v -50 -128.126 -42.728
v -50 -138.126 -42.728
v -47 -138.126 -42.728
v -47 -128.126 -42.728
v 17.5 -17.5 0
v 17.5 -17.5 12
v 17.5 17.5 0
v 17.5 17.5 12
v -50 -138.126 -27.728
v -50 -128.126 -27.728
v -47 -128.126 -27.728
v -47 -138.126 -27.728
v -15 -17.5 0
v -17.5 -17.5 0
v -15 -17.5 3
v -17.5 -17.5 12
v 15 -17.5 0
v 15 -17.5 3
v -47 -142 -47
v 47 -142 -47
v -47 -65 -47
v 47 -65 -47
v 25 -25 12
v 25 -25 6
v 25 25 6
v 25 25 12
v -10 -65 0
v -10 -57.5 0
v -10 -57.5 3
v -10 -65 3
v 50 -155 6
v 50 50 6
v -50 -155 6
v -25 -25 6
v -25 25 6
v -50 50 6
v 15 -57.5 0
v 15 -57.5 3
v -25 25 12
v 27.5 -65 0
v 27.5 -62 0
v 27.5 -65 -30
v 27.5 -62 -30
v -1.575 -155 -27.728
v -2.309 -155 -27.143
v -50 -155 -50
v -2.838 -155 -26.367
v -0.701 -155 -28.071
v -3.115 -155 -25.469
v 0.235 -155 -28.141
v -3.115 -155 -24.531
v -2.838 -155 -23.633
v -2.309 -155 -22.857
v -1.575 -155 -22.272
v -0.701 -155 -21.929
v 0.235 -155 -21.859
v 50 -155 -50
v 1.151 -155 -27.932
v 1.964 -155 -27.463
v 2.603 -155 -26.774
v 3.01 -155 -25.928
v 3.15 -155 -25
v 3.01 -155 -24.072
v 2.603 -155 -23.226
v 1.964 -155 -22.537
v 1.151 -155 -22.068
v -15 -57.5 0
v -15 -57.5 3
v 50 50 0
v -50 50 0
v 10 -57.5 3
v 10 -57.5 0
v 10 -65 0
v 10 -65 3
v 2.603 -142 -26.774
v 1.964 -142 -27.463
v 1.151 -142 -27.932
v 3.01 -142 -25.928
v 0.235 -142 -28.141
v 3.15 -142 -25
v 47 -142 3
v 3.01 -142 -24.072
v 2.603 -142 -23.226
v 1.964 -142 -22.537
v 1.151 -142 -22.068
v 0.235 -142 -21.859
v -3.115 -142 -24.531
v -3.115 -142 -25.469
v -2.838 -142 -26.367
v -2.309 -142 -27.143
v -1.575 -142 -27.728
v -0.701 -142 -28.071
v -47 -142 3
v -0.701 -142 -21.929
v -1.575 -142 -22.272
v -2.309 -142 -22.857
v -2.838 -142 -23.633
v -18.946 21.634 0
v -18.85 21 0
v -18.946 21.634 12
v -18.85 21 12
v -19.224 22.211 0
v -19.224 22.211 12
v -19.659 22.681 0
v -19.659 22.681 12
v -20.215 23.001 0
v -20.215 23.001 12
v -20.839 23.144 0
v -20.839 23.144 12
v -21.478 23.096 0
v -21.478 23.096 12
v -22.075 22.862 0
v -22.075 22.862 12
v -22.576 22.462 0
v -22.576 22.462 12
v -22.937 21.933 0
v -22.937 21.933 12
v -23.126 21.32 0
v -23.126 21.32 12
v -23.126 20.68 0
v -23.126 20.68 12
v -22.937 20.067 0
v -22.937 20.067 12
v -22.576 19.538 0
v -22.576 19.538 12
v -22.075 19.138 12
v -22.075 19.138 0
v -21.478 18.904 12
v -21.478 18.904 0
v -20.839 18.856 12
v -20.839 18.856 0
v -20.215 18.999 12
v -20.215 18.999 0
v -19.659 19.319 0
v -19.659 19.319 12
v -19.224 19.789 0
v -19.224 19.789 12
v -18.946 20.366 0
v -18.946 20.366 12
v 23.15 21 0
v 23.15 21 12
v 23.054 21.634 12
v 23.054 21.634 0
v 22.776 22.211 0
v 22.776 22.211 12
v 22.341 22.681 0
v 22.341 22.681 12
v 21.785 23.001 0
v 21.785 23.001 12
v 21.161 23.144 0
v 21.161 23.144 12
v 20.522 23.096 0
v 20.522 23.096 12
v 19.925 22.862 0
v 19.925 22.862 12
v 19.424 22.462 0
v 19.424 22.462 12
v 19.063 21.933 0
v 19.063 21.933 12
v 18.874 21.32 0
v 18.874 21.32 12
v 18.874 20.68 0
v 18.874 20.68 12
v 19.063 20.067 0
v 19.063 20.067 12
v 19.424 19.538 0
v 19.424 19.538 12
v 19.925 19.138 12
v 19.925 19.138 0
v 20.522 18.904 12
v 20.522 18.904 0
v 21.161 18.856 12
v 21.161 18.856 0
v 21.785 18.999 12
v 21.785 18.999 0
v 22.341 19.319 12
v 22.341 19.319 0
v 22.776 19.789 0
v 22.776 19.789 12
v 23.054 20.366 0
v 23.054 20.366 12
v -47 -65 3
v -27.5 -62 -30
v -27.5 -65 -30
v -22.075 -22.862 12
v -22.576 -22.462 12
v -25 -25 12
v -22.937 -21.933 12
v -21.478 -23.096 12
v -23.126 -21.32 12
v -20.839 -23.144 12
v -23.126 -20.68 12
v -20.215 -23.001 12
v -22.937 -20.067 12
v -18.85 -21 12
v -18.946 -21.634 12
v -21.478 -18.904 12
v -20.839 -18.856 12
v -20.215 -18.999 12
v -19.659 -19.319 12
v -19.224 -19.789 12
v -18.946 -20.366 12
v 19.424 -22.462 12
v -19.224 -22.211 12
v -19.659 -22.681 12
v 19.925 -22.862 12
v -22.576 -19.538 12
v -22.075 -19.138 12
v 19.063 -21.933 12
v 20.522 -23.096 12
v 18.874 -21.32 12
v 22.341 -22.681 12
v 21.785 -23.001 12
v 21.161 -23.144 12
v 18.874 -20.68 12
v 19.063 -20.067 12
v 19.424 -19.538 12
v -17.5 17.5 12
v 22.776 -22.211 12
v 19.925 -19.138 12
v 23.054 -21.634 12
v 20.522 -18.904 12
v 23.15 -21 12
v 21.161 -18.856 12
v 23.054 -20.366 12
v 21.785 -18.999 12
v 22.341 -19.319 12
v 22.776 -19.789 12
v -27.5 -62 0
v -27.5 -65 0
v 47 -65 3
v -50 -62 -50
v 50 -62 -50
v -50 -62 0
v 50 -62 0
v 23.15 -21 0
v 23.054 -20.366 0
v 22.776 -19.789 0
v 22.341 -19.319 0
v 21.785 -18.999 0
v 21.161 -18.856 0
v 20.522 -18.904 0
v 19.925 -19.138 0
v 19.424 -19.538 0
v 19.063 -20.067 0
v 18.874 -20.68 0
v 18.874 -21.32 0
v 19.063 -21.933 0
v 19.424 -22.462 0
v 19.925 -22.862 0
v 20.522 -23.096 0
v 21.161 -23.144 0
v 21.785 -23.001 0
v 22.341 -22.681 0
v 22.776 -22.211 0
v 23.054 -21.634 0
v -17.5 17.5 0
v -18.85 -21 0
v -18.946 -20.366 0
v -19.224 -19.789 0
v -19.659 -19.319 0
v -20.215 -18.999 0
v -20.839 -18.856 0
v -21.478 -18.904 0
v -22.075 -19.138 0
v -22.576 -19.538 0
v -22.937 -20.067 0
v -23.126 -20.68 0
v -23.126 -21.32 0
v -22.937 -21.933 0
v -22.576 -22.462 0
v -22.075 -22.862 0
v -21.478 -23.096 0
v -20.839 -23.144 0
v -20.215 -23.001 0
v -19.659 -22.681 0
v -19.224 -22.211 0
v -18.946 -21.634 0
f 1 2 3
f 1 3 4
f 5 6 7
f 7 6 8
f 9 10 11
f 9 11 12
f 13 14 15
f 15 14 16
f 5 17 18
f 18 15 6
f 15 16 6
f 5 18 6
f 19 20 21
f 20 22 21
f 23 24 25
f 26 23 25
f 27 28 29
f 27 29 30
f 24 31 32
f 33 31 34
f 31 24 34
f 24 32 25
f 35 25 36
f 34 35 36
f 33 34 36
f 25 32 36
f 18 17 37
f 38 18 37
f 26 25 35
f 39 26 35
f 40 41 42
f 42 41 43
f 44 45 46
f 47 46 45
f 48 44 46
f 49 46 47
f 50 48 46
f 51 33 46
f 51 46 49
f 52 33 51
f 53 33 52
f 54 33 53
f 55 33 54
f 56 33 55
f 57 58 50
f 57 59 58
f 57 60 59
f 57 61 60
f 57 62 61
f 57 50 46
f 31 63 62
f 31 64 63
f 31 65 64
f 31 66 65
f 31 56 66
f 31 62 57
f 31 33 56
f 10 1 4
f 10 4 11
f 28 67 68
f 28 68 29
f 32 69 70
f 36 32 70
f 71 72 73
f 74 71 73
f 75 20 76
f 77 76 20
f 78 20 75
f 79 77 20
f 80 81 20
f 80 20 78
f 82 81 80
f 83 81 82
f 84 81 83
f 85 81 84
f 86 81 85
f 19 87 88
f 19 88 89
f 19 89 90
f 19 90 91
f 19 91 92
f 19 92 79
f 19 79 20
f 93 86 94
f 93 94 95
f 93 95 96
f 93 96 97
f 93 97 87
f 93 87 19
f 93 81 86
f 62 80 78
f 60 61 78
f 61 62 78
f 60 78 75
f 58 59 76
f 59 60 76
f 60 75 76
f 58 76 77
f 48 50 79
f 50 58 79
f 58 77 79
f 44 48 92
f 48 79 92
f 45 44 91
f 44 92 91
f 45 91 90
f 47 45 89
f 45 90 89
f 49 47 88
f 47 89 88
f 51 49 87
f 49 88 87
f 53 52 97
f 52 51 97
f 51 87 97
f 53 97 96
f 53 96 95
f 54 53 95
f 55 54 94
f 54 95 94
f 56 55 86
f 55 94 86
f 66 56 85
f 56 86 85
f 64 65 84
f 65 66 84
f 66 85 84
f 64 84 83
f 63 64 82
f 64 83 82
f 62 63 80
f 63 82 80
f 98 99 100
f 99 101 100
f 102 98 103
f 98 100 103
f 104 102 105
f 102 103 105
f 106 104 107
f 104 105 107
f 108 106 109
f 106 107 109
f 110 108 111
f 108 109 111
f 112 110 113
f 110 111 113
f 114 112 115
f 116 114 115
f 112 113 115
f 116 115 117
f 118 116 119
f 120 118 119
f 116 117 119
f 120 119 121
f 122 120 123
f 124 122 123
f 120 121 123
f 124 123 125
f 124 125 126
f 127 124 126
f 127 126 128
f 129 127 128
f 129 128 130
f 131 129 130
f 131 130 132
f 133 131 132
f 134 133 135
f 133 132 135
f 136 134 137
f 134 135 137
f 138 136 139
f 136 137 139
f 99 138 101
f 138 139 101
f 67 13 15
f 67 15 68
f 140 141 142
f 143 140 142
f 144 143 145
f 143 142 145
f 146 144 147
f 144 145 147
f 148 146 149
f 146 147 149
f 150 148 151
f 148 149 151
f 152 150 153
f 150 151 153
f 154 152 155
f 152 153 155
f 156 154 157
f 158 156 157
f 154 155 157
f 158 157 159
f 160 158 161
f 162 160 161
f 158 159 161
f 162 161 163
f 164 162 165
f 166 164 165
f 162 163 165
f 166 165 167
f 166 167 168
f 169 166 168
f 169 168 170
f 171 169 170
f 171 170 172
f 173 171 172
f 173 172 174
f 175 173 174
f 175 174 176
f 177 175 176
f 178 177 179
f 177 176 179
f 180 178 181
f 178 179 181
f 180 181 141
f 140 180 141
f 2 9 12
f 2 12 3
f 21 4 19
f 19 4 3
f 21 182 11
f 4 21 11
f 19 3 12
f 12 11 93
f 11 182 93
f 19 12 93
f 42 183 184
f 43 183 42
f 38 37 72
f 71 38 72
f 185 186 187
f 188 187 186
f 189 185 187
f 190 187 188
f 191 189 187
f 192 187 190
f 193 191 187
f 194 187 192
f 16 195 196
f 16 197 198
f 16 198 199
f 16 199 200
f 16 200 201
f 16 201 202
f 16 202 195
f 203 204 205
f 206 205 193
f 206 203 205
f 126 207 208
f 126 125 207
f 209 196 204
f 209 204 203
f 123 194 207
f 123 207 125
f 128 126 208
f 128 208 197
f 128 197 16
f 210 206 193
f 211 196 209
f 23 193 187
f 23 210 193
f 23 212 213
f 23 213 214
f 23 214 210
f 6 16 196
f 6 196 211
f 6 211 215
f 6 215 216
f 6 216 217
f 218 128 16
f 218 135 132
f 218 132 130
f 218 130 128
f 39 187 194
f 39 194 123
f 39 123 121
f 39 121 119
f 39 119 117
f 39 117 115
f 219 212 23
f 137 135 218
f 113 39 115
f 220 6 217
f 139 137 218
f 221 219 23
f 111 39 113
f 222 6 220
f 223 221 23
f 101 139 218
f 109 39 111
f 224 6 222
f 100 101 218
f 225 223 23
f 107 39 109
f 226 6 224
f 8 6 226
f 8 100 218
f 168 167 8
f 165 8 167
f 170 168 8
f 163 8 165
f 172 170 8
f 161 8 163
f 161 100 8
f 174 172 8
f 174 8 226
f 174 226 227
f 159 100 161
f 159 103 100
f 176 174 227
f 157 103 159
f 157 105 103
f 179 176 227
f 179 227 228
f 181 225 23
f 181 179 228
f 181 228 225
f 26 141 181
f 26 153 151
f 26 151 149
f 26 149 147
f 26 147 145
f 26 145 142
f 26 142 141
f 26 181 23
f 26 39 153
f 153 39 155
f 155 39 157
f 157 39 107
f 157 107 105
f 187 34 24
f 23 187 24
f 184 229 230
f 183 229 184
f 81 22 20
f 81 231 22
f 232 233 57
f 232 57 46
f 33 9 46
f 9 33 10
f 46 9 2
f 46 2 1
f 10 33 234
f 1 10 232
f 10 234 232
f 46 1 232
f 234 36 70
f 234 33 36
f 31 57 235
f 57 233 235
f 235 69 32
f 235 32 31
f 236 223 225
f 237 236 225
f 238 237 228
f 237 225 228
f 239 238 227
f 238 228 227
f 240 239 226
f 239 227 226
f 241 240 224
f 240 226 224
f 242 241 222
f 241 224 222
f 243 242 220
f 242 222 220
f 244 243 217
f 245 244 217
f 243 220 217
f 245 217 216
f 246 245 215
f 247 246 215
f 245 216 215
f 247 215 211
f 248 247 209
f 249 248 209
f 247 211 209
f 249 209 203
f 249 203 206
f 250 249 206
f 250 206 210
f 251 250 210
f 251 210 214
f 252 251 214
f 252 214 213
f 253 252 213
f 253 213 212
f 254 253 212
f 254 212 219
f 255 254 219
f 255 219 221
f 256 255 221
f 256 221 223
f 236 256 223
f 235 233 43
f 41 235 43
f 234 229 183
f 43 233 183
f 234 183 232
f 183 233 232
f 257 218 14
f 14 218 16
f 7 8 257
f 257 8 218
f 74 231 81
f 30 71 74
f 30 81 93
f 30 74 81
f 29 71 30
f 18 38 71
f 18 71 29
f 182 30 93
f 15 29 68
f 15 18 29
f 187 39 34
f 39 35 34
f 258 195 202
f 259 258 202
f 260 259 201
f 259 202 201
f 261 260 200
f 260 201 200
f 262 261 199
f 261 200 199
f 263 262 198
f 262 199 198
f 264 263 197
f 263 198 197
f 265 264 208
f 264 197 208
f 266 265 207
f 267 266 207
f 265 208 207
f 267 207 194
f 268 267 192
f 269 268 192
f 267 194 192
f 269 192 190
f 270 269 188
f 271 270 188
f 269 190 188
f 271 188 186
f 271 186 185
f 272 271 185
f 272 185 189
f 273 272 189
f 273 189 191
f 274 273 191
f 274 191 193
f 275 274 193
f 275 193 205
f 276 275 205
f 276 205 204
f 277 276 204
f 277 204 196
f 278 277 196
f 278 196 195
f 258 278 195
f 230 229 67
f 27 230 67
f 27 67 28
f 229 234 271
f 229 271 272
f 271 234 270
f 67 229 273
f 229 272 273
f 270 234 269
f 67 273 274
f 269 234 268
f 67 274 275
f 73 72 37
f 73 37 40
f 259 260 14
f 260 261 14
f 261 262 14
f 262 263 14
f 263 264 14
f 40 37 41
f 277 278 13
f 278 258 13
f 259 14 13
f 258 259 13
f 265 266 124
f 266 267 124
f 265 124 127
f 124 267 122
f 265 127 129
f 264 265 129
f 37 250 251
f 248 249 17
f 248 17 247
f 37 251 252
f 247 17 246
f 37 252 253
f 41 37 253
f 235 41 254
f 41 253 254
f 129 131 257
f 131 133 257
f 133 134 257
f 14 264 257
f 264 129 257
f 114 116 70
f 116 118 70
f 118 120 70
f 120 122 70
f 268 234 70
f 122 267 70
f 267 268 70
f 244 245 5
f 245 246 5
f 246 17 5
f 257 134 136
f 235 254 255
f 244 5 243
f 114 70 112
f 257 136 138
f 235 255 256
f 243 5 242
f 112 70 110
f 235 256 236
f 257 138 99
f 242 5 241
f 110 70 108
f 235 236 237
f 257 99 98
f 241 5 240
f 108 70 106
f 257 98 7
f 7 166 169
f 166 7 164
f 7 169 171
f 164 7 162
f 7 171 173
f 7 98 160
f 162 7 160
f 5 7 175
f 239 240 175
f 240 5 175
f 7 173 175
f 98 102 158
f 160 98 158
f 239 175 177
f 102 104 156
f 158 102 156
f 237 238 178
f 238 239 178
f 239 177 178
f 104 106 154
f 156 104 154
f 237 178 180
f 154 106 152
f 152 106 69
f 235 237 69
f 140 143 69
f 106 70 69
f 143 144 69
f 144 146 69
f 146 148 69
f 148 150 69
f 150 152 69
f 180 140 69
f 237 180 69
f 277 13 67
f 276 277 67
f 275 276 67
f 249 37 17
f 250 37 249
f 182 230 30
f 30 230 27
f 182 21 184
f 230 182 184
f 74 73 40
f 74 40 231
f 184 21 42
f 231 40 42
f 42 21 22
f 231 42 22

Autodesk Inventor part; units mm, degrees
ref_plane "YZ Plane" through (0, 0, 0) normal (1, 0, 0) x (0, 1, 0)
ref_plane "XZ Plane" through (0, 0, 0) normal (0, 1, 0) x (-1, 0, 0)
ref_plane "XY Plane" through (0, 0, 0) normal (0, 0, 1) x (1, 0, 0)
sketch "草图1" plane through (0, 0, 0) normal (0, 0, 1) x (1, 0, 0)
  line L0 (-50, -50) -> (50, -50)
  line L1 (50, -50) -> (50, 50)
  line L2 (50, 50) -> (-50, 50)
  line L3 (-50, 50) -> (-50, -50)
  line L4 (-50, -50) -> (50, 50) construction
  line L5 (50, -50) -> (-50, 50) construction
  line L6 (-50, -50) -> (50, -50)
  line L7 (50, -50) -> (50, -65)
  line L8 (50, -65) -> (-50, -65)
  line L9 (-50, -65) -> (-50, -50)
  point P0 (0, 0)
  dimension "d0" = 100
  dimension "d1" = 100
  dimension "d2" = 15
extrude "拉伸1" add sketch "草图1" along normal blind 6
sketch "草图2" plane through (0, 0, 6) normal (0, 0, 1) x (1, 0, 0)
  line L0 (-25, -25) -> (25, -25)
  line L1 (25, -25) -> (25, 25)
  line L2 (25, 25) -> (-25, 25)
  line L3 (-25, 25) -> (-25, -25)
  line L4 (-25, -25) -> (25, 25) construction
  line L5 (25, -25) -> (-25, 25) construction
  point P0 (0, 0)
  dimension "d5" = 50
  dimension "d6" = 50
extrude "拉伸2" add sketch "草图2" along normal blind 6
sketch "草图3" plane through (0, 0, 12) normal (0, 0, 1) x (1, 0, 0)
  line L0 (-17.5, -17.5) -> (17.5, -17.5)
  line L1 (17.5, -17.5) -> (17.5, 17.5)
  line L2 (17.5, 17.5) -> (-17.5, 17.5)
  line L3 (-17.5, 17.5) -> (-17.5, -17.5)
  line L4 (-17.5, -17.5) -> (17.5, 17.5) construction
  line L5 (17.5, -17.5) -> (-17.5, 17.5) construction
  point P0 (0, 0)
  dimension "d9" = 35
  dimension "d10" = 35
extrude "拉伸3" cut sketch "草图3" against normal through all
sketch "草图4" plane through (0, 0, 12) normal (0, 0, 1) x (1, 0, 0)
  line L0 (-21, -21) -> (21, -21)
  line L1 (21, -21) -> (21, 21)
  line L2 (21, 21) -> (-21, 21)
  line L3 (-21, 21) -> (-21, -21)
  line L4 (-21, -21) -> (21, 21) construction
  line L5 (21, -21) -> (-21, 21) construction
  circle A0 centre (21, 21) radius 2.15
  circle A1 centre (-21, 21) radius 2.15
  circle A2 centre (-21, -21) radius 2.15
  circle A3 centre (21, -21) radius 2.15
  point P0 (0, 0)
  dimension "d13" = 42
  dimension "d14" = 42
  dimension "d15" = 4.3
  dimension "d16" = 4.3
  dimension "d17" = 4.3
  dimension "d18" = 4.3
extrude "拉伸4" cut sketch "草图4" against normal through all contours L3 A2 L0 | L0 A2 L3 | A3 L1 L0 | L0 L1 A3 | A1 L2 L3 | L3 L2 A1 | A0 L2 L1 | L1 L2 A0
sketch "草图5" plane through (0, 0, 0) normal (0, 0, -1) x (-1, 0, 0)
  line L0 (0, 0) -> (15, 0)
  line L1 (15, -17.5) -> (15, -57.5)
  line L2 (15, -57.5) -> (0, -57.5)
  line L3 (-17.5, -17.5) -> (17.5, -17.5) projected
  line L4 (15, -17.5) -> (0, -17.5)
  line L5 (-15, -17.5) -> (-15, -57.5)
  line L6 (-15, -57.5) -> (0, -57.5)
  line L7 (17.5, -17.5) -> (-17.5, -17.5)
  line L8 (0, -57.5) -> (10, -57.5)
  line L9 (10, -57.5) -> (10, -76.7389)
  line L10 (10, -76.7389) -> (0, -76.7389)
  line L11 (0, -76.7389) -> (0, -57.5)
  line L12 (-10, -57.5) -> (-10, -76.7389)
  line L13 (-10, -76.7389) -> (0, -76.7389)
  dimension "d21" = 15
  dimension "d22" = 40
  dimension "d23" = 10
extrude "拉伸5" cut sketch "草图5" against normal blind 3
sketch "草图6" plane through (0, 0, 0) normal (0, 0, -1) x (-1, 0, 0)
  point P0 (0, 0)
sketch "草图7" plane through (-50, -65, 6) normal (0, -1, 0) x (1, 0, 0)
  line L0 (100, -6) -> (0, -6) projected
  line L1 (0, -6) -> (0, 0) projected
  line L2 (100, -6) -> (0, -6)
  line L3 (0, -6) -> (0, 0)
  line L4 (0, 0) -> (100, 0)
  line L5 (100, 0) -> (100, -6)
  point P0 (50, -6)
extrude "拉伸6" add sketch "草图7" along normal blind 80
sketch "草图8" plane through (0, 0, 0) normal (0, 0, -1) x (-1, 0, 0)
  line L0 (10, -65) -> (-10, -65) projected
  line L1 (50, 50) -> (50, -145) projected
  line L2 (0, -65) -> (50, -65)
  line L3 (50, -65) -> (50, -145)
  line L4 (50, -145) -> (0, -145)
  line L5 (0, -145) -> (0, -65)
  line L6 (-50, 50) -> (-50, -145)
  line L7 (0, -65) -> (-50, -65)
  line L8 (-50, -145) -> (0, -145)
  point P0 (0, 0)
extrude "拉伸7" cut sketch "草图8" against normal blind 3
sketch "草图9" plane through (0, 0, 3) normal (0, 0, -1) x (-1, 0, 0)
  line L0 (-50, -145) -> (-50, -65) projected
  line L1 (-50, -65) -> (-47, -65)
  line L2 (-47, -65) -> (-47, -142)
  line L3 (-47, -155.7604) -> (-50, -155.7604)
  line L4 (-50, -145) -> (-50, -65)
  line L5 (50, 50) -> (50, -145) projected
  line L6 (50, -65) -> (47, -65)
  line L7 (47, -65) -> (47, -142)
  line L8 (47, -155.7604) -> (50, -155.7604)
  line L9 (50, -145) -> (50, -65)
  line L10 (-47, -142) -> (47, -142)
  line L11 (63.4475, -142) -> (63.4475, -145)
  line L12 (50, -145) -> (-50, -145)
  line L13 (-50, -145) -> (-50, -142)
  point P0 (0, 0)
  point P1 (50, -145)
  dimension "d30" = 3
  dimension "d31" = 3
  dimension "d32" = 3
extrude "拉伸8" add sketch "草图9" along normal blind 50
sketch "草图10" plane through (0, 0, -47) normal (0, 0, -1) x (-1, 0, 0)
  line L0 (50, -65) -> (47, -65) projected
  line L1 (50, -145) -> (50, -65) projected
  line L2 (-50, 50) -> (-50, -145) projected
  line L3 (-50, -145) -> (50, -145)
  line L4 (50, -145) -> (50, -65)
  line L5 (50, -65) -> (-50, -65)
  line L6 (-50, -65) -> (-50, -145)
  point P0 (0, 0)
extrude "拉伸9" add sketch "草图10" along normal blind 3
sketch "草图11" plane through (-50, 50, 0) normal (-1, 0, 0) x (0, 0, 1)
  line L0 (-42.728, -178.1257) -> (-27.728, -178.1257)
  line L1 (-27.728, -178.1257) -> (-27.728, -188.1257)
  line L2 (-27.728, -188.1257) -> (-42.728, -188.1257)
  line L3 (-42.728, -188.1257) -> (-42.728, -178.1257)
  point P0 (0, -50)
  dimension "d37" = 10
  dimension "d38" = 15
extrude "拉伸10" cut sketch "草图11" against normal blind 3
sketch "草图12" plane through (-50, -145, 6) normal (0, -1, 0) x (1, 0, 0)
  line L0 (0, -56) -> (100, -56) projected
  line L1 (100, -6) -> (100, -56) projected
  line L2 (100, -6) -> (97, -6) projected
  line L3 (100, -6) -> (100, -56) projected
  line L4 (0, -56) -> (100, -56) projected
  line L5 (0, -6) -> (0, -56) projected
  line L6 (3, -6) -> (0, -6) projected
  line L7 (3, -6) -> (3, -53) projected
  line L8 (3, -53) -> (97, -53) projected
  line L9 (97, -6) -> (97, -53) projected
  line L10 (100, -56) -> (0, -56)
  line L11 (0, -56) -> (0, -6)
  line L12 (0, -6) -> (100, -6)
  line L13 (100, -6) -> (100, -56)
  point P0 (50, -6)
sketch "草图13" plane through (0, 0, -50) normal (0, 0, -1) x (-1, 0, 0)
  line L0 (50, -145) -> (50, -65) projected
  line L1 (50, -65) -> (-50, -65)
  line L2 (-53.2797, -65) -> (-53.2797, -62)
  line L3 (-50, -62) -> (50, -62)
  line L4 (50, -62) -> (50, -65)
  line L5 (-50, 50) -> (-50, -65) projected
  line L6 (-50, -62) -> (-50, -65)
  line L7 (-50, 50) -> (-50, -65) projected
  line L8 (-50, 50) -> (-50, -145) projected
  line L9 (-50, -65) -> (-50, -145) projected
  line L10 (-50, 50) -> (-50, -65) projected
  line L11 (-50, 50) -> (-50, -145) projected
  line L12 (-50, -65) -> (-50, -145) projected
  point P0 (0, 0)
  dimension "d41" = 3
sketch "草图14" plane through (0, 0, 0) normal (0, 0, -1) x (-1, 0, 0)
  point P0 (0, 0)
extrude "拉伸11" add sketch "草图13" against normal blind 50
sketch "草图15" plane through (-50, -62, -50) normal (0, 1, 0) x (1, 0, 0)
  line L0 (50, -50) -> (35, -50)
  line L1 (35, -50) -> (35, -38)
  line L2 (35, -38) -> (50, -38)
  line L3 (50, -38) -> (50, -50)
  line L4 (50, -50) -> (65, -50)
  line L5 (65, -50) -> (65, -38)
  line L6 (65, -38) -> (50, -38)
  dimension "d44" = 15
  dimension "d45" = 12
extrude "拉伸12" cut sketch "草图15" against normal blind 10
sketch "草图16" plane through (-50, -145, 6) normal (0, -1, 0) x (1, 0, 0)
  line L0 (50, -6) -> (50, -31)
  line L1 (100, -56) -> (0, -56) projected
  circle A0 centre (50, -31) radius 3.15
  dimension "d48" = 25
  dimension "d49" = 6.3
extrude "拉伸13" cut sketch "草图16" against normal blind 10
sketch "草图17" plane through (0, 0, 12) normal (0, 0, 1) x (1, 0, 0)
  line L0 (17.5, 17.5) -> (-17.5, 17.5) projected
  line L1 (-17.5, -17.5) -> (17.5, -17.5)
  line L2 (17.5, -17.5) -> (17.5, 17.5)
  line L3 (17.5, 17.5) -> (-17.5, 17.5)
  line L4 (-17.5, 17.5) -> (-17.5, -17.5)
  line L5 (-17.5, -17.5) -> (17.5, 17.5) construction
  line L6 (17.5, -17.5) -> (-17.5, 17.5) construction
  line L7 (-12.5, -12.5) -> (12.5, -12.5)
  line L8 (12.5, -12.5) -> (12.5, 12.5)
  line L9 (12.5, 12.5) -> (-12.5, 12.5)
  line L10 (-12.5, 12.5) -> (-12.5, -12.5)
  line L11 (-12.5, -12.5) -> (12.5, 12.5) construction
  line L12 (12.5, -12.5) -> (-12.5, 12.5) construction
  point P0 (0, 0)
  dimension "d52" = 25
  dimension "d53" = 25
extrude "拉伸14" add sketch "草图17" against normal blind 12
sketch "草图18" plane through (0, 0, 0) normal (0, 0, -1) x (-1, 0, 0)
  line L0 (-15, -17.5) -> (15, -17.5) projected
  line L1 (-15, -17.5) -> (15, -17.5)
  line L2 (15, -17.5) -> (15, -12.5)
  line L3 (15, -12.5) -> (-15, -12.5)
  line L4 (-15, -12.5) -> (-15, -17.5)
  point P0 (0, 0)
  point P1 (15, -17.5)
  dimension "d56" = 5
extrude "拉伸15" cut sketch "草图18" against normal blind 3
sketch "草图19" plane through (-50, -62, -50) normal (0, 1, 0) x (1, 0, 0)
  line L0 (35, -50) -> (35, -38) projected
  line L1 (35, -38) -> (65, -38) projected
  line L2 (65, -38) -> (65, -50) projected
  line L3 (100, -50) -> (65, -50) projected
  line L4 (100, 0) -> (100, -50) projected
  line L5 (0, 0) -> (100, 0) projected
  line L6 (0, 0) -> (0, -50) projected
  line L7 (35, -50) -> (0, -50) projected
  line L8 (35, -50) -> (35, -38) projected
  line L9 (35, -38) -> (65, -38) projected
  line L10 (65, -38) -> (65, -50) projected
  line L11 (100, -50) -> (65, -50) projected
  line L12 (100, 0) -> (100, -50) projected
  line L13 (0, 0) -> (100, 0) projected
  line L14 (0, 0) -> (0, -50) projected
  line L15 (35, -50) -> (0, -50) projected
  line L16 (50, -50) -> (77.5, -50)
  line L17 (77.5, -50) -> (77.5, -20)
  line L18 (77.5, -20) -> (50, -20)
  line L19 (50, -20) -> (50, -50)
  line L20 (50, -50) -> (22.5, -50)
  line L21 (22.5, -50) -> (22.5, -20)
  line L22 (22.5, -20) -> (50, -20)
  dimension "d59" = 27.5
  dimension "d60" = 30
extrude "拉伸16" cut sketch "草图19" against normal blind 3 contours L7 L21 L22 L19 L1 L0 | L19 L18 L17 L3 L2 L1
sketch "草图20" plane through (-50, -145, 6) normal (0, -1, 0) x (1, 0, 0)
  circle A0 centre (50, -31) radius 3.15 projected
  circle A1 centre (50, -31) radius 3.15 projected
  line L0 (100, -56) -> (100, 0) projected
  line L1 (100, 0) -> (0, 0) projected
  line L2 (0, 0) -> (0, -56) projected
  line L3 (100, -56) -> (0, -56) projected
  circle A2 centre (50, -31) radius 3.15
  line L4 (100, -56) -> (0, -56)
  line L5 (0, -56) -> (0, 0)
  line L6 (0, 0) -> (100, 0)
  line L7 (100, 0) -> (100, -56)
  point P0 (50, -6)
extrude "拉伸17" add sketch "草图20" along normal blind 10
sketch "草图21" plane through (0, 0, 12) normal (0, 0, 1) x (1, 0, 0)
  line L0 (-17.5, -17.5) -> (17.5, -17.5)
  line L1 (17.5, -17.5) -> (17.5, 17.5)
  line L2 (17.5, 17.5) -> (-17.5, 17.5)
  line L3 (-17.5, 17.5) -> (-17.5, -17.5)
  line L4 (-17.5, -17.5) -> (17.5, 17.5) construction
  line L5 (17.5, -17.5) -> (-17.5, 17.5) construction
  point P0 (0, 0)
  dimension "d65" = 35
  dimension "d66" = 35
extrude "拉伸18" cut sketch "草图21" against normal blind 15
sketch "草图22" plane through (0, 0, 0) normal (0, 0, -1) x (-1, 0, 0)
  point P0 (0, 0)
properties part number "12"
